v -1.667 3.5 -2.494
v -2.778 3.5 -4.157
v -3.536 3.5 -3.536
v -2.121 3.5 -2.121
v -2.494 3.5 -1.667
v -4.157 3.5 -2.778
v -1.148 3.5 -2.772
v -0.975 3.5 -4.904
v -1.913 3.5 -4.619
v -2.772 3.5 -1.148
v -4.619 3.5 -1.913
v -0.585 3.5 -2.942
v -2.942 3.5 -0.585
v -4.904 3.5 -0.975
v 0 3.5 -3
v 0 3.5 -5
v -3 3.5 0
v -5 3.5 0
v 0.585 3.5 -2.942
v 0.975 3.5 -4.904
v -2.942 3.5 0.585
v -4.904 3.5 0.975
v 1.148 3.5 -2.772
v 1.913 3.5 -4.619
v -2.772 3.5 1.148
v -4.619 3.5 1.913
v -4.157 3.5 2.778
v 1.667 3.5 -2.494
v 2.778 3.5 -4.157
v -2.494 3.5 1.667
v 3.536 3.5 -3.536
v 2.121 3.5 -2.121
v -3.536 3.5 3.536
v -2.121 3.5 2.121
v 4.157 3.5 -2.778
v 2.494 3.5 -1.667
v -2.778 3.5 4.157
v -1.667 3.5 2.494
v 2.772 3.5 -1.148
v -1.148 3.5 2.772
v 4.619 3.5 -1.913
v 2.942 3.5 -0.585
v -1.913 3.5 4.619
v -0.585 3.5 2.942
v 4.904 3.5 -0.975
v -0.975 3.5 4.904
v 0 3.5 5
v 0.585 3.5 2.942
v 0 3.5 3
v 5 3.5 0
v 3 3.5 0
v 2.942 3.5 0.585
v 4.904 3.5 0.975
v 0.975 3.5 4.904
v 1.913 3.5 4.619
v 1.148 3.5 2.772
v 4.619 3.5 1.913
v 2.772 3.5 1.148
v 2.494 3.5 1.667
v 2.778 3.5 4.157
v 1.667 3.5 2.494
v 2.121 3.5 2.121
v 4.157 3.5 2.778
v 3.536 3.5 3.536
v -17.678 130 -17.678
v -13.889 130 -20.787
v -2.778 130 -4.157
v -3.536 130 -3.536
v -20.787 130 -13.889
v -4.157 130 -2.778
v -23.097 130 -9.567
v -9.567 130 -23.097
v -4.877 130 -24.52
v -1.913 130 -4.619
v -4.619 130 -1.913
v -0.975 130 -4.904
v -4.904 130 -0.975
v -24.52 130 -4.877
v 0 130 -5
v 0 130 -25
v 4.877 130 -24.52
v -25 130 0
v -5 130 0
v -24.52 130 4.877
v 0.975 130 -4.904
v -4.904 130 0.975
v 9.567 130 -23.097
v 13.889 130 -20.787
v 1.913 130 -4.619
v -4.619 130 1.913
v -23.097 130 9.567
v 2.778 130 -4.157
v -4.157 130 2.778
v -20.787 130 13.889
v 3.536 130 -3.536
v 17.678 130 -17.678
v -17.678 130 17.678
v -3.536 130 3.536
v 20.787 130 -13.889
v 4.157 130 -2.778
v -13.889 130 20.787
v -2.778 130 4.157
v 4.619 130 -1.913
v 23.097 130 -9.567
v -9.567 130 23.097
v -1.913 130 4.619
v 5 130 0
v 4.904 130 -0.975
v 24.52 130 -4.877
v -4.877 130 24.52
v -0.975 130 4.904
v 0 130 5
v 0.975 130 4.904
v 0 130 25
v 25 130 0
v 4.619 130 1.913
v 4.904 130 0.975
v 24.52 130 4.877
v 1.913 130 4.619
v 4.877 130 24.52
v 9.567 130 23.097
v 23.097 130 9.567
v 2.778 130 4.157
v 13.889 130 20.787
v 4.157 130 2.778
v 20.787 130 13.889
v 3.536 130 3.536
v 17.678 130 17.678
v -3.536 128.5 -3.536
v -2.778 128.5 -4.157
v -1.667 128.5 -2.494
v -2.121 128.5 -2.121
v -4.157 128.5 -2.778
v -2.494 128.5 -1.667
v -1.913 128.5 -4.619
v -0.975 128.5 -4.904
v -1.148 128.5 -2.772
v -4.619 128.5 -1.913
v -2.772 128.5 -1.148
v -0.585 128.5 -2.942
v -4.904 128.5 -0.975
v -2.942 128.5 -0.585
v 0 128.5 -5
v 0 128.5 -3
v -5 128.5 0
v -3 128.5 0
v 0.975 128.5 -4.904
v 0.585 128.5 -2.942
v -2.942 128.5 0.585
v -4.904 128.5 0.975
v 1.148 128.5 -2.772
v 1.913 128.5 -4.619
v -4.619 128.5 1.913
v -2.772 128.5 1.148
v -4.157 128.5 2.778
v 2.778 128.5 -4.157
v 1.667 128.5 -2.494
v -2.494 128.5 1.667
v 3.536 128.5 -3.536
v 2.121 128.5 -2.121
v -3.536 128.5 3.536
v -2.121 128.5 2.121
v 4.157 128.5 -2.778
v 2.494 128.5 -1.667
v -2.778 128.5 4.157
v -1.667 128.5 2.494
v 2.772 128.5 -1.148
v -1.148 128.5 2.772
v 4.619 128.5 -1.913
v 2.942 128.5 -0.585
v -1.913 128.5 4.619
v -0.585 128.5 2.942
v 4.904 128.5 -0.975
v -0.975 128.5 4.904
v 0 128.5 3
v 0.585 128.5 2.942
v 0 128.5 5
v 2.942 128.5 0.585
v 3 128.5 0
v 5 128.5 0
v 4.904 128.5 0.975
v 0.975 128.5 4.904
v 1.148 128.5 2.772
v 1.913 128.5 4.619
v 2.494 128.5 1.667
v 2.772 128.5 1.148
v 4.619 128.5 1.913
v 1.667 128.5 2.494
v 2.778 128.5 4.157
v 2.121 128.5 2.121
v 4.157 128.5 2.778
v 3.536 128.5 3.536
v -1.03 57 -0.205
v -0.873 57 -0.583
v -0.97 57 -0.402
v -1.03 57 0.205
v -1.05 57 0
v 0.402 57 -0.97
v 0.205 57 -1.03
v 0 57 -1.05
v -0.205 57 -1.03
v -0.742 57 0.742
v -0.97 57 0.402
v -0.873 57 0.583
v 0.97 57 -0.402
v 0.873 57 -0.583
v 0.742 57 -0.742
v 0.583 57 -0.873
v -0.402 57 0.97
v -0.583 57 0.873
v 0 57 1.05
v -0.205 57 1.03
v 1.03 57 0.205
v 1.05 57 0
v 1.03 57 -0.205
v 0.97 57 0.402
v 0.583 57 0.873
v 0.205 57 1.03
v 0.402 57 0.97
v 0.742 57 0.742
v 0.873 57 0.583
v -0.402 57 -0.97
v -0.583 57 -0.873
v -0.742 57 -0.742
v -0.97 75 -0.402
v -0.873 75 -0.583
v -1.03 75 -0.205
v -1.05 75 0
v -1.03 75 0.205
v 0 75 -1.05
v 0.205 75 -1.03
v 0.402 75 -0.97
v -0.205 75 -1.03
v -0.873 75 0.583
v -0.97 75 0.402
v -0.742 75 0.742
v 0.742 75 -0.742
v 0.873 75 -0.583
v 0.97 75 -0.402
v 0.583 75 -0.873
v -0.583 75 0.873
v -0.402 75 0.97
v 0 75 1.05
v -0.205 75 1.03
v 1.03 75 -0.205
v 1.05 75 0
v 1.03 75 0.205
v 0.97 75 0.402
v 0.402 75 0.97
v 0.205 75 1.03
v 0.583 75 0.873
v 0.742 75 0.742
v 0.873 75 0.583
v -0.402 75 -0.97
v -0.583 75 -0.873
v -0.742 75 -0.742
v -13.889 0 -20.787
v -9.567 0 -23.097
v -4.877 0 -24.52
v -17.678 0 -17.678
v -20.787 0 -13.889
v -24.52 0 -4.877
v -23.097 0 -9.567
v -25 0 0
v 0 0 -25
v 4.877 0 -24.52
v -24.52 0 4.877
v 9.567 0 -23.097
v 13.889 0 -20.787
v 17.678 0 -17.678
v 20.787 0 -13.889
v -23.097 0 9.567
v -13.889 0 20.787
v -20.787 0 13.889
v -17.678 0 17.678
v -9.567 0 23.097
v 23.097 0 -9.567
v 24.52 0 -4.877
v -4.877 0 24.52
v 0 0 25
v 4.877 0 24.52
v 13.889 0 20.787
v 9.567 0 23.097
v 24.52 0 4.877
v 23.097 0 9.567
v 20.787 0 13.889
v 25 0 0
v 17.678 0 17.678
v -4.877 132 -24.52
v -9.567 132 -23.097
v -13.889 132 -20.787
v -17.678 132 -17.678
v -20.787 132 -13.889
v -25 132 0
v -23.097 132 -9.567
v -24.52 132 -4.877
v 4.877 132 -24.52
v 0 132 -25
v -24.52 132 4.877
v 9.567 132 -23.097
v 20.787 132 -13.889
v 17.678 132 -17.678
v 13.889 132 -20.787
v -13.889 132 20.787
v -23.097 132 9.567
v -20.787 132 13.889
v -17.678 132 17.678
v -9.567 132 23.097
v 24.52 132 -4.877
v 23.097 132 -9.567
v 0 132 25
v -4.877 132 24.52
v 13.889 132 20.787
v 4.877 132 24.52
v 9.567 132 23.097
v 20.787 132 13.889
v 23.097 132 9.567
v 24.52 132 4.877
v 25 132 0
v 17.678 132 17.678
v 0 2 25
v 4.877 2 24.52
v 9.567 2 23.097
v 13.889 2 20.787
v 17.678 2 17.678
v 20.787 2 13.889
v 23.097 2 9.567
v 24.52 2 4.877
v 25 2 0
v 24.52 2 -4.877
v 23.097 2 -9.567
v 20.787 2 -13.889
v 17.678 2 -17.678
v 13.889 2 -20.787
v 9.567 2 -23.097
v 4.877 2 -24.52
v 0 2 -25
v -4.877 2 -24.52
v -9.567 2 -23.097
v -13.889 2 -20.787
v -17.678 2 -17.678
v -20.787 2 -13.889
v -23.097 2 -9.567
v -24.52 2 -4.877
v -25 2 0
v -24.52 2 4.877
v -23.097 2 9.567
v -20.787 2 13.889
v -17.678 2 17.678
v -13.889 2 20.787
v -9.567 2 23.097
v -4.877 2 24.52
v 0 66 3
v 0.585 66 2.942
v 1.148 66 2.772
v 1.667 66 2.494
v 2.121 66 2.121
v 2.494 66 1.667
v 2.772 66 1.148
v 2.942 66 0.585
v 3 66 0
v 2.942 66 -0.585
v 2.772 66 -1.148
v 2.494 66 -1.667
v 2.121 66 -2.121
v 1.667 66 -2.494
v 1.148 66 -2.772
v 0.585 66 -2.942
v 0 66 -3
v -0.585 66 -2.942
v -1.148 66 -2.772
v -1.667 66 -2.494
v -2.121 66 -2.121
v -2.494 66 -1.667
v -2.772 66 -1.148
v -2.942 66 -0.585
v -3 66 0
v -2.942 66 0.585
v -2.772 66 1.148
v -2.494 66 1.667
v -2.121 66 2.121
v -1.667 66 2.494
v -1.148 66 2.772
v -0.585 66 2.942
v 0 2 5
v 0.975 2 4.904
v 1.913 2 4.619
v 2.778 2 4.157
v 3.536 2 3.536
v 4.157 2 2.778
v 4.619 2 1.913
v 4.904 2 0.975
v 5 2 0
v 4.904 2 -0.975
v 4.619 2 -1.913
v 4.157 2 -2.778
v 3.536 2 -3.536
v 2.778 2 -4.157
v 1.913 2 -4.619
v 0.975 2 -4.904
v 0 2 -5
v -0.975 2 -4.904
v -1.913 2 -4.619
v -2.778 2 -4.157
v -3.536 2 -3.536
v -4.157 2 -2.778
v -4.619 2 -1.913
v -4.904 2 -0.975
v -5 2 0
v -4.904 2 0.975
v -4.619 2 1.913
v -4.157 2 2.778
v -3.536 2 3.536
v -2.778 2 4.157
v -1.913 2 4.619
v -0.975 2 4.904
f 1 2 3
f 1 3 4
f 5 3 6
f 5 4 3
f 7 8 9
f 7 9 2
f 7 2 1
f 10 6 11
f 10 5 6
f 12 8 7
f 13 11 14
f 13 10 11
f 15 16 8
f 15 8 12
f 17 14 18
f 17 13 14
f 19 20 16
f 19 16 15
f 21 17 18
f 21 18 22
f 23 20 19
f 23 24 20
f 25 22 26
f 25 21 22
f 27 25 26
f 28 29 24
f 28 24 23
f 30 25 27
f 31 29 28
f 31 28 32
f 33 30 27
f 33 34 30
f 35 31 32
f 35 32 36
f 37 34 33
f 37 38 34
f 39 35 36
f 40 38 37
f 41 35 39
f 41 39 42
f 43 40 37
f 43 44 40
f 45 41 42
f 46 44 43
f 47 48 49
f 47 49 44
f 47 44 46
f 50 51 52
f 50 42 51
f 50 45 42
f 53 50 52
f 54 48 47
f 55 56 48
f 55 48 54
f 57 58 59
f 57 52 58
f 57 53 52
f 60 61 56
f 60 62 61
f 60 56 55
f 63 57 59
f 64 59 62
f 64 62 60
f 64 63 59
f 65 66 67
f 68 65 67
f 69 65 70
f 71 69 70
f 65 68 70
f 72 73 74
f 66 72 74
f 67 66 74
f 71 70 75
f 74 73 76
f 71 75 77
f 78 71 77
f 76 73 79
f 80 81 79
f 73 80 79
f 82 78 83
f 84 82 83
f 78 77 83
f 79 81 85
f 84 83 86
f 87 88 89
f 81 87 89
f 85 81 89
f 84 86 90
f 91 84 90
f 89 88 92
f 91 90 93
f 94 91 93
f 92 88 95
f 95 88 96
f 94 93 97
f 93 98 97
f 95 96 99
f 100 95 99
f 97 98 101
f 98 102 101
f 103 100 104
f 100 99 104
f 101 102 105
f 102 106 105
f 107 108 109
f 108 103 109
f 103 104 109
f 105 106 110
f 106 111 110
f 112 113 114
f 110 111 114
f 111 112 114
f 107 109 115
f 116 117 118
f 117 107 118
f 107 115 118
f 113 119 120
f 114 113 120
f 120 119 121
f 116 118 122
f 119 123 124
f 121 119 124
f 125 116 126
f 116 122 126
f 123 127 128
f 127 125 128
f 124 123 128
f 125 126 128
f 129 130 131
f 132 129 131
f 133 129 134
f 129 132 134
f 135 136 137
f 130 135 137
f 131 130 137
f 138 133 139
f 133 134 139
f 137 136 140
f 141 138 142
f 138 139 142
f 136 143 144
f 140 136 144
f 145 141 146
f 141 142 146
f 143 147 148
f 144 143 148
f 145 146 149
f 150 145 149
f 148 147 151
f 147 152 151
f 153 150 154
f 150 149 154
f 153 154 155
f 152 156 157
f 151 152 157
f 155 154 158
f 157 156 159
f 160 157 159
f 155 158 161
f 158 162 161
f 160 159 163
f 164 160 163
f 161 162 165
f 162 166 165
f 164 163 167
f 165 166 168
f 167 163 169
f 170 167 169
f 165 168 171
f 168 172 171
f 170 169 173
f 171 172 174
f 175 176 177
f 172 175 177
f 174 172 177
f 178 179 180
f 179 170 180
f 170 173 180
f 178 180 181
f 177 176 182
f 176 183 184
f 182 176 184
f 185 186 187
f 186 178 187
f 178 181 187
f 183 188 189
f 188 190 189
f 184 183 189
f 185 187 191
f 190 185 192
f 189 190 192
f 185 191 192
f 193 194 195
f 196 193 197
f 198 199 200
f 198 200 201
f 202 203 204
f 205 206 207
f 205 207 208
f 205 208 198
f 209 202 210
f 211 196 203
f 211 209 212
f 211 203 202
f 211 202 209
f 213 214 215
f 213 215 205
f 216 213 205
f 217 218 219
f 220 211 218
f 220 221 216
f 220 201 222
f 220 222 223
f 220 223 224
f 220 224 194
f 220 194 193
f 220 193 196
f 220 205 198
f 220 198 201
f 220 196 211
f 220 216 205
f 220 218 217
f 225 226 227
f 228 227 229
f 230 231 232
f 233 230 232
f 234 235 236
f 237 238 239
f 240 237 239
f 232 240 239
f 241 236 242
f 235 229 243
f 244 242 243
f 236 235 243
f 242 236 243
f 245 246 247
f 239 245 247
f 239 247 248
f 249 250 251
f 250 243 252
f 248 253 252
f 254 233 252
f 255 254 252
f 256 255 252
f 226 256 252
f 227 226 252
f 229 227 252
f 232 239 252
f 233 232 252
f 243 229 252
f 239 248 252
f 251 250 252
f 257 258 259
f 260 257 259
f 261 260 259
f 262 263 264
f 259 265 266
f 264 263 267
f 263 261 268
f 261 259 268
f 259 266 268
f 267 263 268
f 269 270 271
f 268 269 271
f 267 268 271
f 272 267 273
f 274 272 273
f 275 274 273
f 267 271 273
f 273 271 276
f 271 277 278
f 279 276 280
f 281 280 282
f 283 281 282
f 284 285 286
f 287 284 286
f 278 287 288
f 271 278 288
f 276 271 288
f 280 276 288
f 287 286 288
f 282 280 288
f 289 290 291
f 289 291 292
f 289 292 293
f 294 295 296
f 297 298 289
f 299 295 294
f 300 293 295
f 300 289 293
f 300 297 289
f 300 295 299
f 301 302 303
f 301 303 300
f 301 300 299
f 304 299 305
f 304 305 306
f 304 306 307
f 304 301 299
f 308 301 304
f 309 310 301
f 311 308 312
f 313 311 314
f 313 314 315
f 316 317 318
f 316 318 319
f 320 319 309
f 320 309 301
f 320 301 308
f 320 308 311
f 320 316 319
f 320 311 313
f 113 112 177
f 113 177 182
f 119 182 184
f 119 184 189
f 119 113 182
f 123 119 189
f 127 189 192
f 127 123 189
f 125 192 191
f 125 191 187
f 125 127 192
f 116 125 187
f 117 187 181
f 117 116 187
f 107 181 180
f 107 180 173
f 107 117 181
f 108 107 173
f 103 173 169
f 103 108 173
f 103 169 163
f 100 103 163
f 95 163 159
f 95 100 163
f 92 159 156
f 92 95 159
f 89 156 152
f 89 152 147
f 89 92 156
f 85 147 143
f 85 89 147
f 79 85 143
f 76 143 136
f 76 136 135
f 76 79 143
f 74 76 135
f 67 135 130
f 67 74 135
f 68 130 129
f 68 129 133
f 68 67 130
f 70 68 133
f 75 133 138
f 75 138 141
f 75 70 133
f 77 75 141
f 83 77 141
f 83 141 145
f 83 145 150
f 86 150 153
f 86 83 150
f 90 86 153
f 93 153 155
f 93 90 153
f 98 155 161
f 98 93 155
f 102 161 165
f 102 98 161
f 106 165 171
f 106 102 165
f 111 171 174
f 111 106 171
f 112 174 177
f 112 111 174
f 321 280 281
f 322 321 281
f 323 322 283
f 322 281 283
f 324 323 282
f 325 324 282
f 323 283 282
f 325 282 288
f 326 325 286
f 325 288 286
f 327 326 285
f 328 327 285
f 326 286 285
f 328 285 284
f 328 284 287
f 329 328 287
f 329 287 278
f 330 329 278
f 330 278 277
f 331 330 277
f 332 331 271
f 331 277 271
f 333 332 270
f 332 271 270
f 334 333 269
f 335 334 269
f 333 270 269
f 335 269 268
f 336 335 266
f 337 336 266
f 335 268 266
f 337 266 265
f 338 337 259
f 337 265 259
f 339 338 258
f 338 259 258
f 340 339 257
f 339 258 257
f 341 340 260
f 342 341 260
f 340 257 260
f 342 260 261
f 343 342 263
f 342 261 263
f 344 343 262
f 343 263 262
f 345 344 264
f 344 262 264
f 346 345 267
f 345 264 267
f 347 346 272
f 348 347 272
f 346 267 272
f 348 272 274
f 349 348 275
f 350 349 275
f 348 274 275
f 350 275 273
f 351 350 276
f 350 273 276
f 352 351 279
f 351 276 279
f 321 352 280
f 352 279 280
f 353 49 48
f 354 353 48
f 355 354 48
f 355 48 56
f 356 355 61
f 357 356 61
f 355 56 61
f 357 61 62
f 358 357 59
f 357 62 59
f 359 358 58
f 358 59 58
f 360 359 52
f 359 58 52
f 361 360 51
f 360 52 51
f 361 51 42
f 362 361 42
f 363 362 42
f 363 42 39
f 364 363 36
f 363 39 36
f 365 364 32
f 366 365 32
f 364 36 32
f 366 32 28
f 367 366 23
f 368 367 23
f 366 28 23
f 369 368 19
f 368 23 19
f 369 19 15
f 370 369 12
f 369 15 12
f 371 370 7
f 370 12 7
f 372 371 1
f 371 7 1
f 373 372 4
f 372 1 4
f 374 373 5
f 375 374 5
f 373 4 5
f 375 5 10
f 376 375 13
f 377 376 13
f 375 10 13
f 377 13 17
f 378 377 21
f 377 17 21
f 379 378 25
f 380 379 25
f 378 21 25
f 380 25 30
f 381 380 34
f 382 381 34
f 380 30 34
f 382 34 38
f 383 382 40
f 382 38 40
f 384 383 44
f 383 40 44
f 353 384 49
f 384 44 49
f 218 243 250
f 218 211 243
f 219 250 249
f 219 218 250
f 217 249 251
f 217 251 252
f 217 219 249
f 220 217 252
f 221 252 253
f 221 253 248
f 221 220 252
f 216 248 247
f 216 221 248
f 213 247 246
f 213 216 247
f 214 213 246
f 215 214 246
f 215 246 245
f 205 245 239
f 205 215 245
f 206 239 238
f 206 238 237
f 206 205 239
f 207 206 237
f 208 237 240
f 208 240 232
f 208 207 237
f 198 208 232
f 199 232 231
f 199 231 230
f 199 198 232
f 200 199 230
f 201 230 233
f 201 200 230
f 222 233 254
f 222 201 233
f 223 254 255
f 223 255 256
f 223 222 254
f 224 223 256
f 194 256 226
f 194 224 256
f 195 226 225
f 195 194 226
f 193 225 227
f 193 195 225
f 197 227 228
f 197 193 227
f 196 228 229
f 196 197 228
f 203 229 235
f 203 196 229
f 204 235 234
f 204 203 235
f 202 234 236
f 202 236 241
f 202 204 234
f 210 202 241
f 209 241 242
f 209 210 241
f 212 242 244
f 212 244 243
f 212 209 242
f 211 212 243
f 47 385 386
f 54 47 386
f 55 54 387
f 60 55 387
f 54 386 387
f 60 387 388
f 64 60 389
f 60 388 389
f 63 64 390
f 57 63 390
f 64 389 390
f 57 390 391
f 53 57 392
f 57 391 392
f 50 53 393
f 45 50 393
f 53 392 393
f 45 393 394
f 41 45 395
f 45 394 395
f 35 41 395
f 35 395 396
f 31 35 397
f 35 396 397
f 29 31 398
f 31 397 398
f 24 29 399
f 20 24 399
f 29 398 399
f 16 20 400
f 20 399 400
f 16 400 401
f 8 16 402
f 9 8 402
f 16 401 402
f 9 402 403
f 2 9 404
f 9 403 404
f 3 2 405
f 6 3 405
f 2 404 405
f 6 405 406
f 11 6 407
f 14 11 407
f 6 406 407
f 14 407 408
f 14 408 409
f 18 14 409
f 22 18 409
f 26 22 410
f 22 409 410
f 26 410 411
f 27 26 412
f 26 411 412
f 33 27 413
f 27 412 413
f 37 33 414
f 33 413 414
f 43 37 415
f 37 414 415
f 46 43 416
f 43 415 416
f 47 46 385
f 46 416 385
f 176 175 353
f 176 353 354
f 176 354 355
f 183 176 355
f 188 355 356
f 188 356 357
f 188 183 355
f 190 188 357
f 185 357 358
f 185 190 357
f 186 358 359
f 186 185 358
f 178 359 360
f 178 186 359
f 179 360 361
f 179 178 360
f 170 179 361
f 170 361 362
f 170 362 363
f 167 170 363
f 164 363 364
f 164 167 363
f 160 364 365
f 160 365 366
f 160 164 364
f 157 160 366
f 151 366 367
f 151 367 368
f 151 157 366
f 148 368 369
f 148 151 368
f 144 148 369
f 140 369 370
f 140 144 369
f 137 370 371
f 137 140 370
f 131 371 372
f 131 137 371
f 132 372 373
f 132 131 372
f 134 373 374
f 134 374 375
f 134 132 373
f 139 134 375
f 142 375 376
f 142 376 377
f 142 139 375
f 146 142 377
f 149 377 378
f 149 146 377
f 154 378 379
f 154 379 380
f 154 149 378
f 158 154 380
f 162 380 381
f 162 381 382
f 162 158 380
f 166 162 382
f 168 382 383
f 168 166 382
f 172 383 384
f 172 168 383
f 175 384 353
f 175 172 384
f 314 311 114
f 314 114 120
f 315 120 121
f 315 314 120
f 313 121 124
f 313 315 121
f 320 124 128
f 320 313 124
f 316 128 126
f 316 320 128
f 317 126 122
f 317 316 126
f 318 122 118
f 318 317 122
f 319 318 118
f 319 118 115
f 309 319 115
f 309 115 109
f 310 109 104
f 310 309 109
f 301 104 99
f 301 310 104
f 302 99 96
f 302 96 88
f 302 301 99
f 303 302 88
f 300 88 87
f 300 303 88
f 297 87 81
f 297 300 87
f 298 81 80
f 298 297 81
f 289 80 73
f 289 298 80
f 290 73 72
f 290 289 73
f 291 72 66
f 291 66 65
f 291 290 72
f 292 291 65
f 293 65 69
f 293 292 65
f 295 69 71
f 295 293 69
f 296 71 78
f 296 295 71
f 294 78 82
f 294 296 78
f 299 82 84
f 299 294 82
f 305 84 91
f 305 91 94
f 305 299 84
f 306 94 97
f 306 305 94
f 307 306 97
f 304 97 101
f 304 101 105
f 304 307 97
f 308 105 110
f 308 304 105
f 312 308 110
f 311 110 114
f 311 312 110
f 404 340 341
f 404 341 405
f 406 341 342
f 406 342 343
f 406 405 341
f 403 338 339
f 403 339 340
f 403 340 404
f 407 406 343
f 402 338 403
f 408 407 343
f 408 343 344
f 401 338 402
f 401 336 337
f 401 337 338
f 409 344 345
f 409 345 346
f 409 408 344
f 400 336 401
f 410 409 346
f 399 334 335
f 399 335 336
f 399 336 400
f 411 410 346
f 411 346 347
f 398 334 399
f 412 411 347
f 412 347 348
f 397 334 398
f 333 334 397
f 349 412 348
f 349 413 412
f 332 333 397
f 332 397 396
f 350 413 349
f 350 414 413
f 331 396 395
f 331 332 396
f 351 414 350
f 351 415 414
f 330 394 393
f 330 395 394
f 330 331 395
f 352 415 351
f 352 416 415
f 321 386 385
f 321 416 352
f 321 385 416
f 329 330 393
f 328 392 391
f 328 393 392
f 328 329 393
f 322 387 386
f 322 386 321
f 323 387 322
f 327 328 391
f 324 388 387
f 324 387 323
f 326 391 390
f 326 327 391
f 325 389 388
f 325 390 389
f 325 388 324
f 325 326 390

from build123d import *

# Parameters (mm, degrees)
SKETCH1_R           = 25
BOSS_EXTRUDE1_DEPTH = 2
SKETCH2_R           = 5
BOSS_EXTRUDE2_DEPTH = 1.5
SKETCH3_R           = 3
BOSS_EXTRUDE3_DEPTH = 62.5
SKETCH4_R           = 1.05
CUT_EXTRUDE1_DEPTH  = 9


with BuildPart() as part:
    # Sketch1 → Boss-Extrude1 (new body)
    with BuildSketch(Plane(origin=(0, 0, 0), x_dir=(1, 0, 0), z_dir=(0, 1, 0))):
        with Locations(Location((0, 0, 0), (0, 0, 270))):
            Circle(SKETCH1_R)
    extrude(amount=BOSS_EXTRUDE1_DEPTH)

    # Sketch2 → Boss-Extrude2 (add)
    with BuildSketch(Plane(origin=(0, 2, 0), x_dir=(1, 0, 0), z_dir=(0, 1, 0))):
        with Locations(Location((0, 0, 0), (0, 0, 270))):
            Circle(SKETCH2_R)
    extrude(amount=BOSS_EXTRUDE2_DEPTH)

    # Sketch3 → Boss-Extrude3 (add)
    with BuildSketch(Plane(origin=(0, 3.5, 0), x_dir=(1, 0, 0), z_dir=(0, 1, 0))):
        with Locations(Location((0, 0, 0), (0, 0, 270))):
            Circle(SKETCH3_R)
    extrude(amount=BOSS_EXTRUDE3_DEPTH)

    # Sketch4 → Cut-Extrude1 (cut)
    with BuildSketch(Plane(origin=(0, 66, 0), x_dir=(1, 0, 0), z_dir=(0, 1, 0))):
        with Locations(Location((0, 0, 0), (0, 0, 270))):
            Circle(SKETCH4_R)
    extrude(amount=-CUT_EXTRUDE1_DEPTH, mode=Mode.SUBTRACT)

    # Mirror6: part across plane


with BuildPart() as part_1:
    add(part.part)
    add(part.part.mirror(Plane.ZX.offset(66)))


solid = part_1.part
